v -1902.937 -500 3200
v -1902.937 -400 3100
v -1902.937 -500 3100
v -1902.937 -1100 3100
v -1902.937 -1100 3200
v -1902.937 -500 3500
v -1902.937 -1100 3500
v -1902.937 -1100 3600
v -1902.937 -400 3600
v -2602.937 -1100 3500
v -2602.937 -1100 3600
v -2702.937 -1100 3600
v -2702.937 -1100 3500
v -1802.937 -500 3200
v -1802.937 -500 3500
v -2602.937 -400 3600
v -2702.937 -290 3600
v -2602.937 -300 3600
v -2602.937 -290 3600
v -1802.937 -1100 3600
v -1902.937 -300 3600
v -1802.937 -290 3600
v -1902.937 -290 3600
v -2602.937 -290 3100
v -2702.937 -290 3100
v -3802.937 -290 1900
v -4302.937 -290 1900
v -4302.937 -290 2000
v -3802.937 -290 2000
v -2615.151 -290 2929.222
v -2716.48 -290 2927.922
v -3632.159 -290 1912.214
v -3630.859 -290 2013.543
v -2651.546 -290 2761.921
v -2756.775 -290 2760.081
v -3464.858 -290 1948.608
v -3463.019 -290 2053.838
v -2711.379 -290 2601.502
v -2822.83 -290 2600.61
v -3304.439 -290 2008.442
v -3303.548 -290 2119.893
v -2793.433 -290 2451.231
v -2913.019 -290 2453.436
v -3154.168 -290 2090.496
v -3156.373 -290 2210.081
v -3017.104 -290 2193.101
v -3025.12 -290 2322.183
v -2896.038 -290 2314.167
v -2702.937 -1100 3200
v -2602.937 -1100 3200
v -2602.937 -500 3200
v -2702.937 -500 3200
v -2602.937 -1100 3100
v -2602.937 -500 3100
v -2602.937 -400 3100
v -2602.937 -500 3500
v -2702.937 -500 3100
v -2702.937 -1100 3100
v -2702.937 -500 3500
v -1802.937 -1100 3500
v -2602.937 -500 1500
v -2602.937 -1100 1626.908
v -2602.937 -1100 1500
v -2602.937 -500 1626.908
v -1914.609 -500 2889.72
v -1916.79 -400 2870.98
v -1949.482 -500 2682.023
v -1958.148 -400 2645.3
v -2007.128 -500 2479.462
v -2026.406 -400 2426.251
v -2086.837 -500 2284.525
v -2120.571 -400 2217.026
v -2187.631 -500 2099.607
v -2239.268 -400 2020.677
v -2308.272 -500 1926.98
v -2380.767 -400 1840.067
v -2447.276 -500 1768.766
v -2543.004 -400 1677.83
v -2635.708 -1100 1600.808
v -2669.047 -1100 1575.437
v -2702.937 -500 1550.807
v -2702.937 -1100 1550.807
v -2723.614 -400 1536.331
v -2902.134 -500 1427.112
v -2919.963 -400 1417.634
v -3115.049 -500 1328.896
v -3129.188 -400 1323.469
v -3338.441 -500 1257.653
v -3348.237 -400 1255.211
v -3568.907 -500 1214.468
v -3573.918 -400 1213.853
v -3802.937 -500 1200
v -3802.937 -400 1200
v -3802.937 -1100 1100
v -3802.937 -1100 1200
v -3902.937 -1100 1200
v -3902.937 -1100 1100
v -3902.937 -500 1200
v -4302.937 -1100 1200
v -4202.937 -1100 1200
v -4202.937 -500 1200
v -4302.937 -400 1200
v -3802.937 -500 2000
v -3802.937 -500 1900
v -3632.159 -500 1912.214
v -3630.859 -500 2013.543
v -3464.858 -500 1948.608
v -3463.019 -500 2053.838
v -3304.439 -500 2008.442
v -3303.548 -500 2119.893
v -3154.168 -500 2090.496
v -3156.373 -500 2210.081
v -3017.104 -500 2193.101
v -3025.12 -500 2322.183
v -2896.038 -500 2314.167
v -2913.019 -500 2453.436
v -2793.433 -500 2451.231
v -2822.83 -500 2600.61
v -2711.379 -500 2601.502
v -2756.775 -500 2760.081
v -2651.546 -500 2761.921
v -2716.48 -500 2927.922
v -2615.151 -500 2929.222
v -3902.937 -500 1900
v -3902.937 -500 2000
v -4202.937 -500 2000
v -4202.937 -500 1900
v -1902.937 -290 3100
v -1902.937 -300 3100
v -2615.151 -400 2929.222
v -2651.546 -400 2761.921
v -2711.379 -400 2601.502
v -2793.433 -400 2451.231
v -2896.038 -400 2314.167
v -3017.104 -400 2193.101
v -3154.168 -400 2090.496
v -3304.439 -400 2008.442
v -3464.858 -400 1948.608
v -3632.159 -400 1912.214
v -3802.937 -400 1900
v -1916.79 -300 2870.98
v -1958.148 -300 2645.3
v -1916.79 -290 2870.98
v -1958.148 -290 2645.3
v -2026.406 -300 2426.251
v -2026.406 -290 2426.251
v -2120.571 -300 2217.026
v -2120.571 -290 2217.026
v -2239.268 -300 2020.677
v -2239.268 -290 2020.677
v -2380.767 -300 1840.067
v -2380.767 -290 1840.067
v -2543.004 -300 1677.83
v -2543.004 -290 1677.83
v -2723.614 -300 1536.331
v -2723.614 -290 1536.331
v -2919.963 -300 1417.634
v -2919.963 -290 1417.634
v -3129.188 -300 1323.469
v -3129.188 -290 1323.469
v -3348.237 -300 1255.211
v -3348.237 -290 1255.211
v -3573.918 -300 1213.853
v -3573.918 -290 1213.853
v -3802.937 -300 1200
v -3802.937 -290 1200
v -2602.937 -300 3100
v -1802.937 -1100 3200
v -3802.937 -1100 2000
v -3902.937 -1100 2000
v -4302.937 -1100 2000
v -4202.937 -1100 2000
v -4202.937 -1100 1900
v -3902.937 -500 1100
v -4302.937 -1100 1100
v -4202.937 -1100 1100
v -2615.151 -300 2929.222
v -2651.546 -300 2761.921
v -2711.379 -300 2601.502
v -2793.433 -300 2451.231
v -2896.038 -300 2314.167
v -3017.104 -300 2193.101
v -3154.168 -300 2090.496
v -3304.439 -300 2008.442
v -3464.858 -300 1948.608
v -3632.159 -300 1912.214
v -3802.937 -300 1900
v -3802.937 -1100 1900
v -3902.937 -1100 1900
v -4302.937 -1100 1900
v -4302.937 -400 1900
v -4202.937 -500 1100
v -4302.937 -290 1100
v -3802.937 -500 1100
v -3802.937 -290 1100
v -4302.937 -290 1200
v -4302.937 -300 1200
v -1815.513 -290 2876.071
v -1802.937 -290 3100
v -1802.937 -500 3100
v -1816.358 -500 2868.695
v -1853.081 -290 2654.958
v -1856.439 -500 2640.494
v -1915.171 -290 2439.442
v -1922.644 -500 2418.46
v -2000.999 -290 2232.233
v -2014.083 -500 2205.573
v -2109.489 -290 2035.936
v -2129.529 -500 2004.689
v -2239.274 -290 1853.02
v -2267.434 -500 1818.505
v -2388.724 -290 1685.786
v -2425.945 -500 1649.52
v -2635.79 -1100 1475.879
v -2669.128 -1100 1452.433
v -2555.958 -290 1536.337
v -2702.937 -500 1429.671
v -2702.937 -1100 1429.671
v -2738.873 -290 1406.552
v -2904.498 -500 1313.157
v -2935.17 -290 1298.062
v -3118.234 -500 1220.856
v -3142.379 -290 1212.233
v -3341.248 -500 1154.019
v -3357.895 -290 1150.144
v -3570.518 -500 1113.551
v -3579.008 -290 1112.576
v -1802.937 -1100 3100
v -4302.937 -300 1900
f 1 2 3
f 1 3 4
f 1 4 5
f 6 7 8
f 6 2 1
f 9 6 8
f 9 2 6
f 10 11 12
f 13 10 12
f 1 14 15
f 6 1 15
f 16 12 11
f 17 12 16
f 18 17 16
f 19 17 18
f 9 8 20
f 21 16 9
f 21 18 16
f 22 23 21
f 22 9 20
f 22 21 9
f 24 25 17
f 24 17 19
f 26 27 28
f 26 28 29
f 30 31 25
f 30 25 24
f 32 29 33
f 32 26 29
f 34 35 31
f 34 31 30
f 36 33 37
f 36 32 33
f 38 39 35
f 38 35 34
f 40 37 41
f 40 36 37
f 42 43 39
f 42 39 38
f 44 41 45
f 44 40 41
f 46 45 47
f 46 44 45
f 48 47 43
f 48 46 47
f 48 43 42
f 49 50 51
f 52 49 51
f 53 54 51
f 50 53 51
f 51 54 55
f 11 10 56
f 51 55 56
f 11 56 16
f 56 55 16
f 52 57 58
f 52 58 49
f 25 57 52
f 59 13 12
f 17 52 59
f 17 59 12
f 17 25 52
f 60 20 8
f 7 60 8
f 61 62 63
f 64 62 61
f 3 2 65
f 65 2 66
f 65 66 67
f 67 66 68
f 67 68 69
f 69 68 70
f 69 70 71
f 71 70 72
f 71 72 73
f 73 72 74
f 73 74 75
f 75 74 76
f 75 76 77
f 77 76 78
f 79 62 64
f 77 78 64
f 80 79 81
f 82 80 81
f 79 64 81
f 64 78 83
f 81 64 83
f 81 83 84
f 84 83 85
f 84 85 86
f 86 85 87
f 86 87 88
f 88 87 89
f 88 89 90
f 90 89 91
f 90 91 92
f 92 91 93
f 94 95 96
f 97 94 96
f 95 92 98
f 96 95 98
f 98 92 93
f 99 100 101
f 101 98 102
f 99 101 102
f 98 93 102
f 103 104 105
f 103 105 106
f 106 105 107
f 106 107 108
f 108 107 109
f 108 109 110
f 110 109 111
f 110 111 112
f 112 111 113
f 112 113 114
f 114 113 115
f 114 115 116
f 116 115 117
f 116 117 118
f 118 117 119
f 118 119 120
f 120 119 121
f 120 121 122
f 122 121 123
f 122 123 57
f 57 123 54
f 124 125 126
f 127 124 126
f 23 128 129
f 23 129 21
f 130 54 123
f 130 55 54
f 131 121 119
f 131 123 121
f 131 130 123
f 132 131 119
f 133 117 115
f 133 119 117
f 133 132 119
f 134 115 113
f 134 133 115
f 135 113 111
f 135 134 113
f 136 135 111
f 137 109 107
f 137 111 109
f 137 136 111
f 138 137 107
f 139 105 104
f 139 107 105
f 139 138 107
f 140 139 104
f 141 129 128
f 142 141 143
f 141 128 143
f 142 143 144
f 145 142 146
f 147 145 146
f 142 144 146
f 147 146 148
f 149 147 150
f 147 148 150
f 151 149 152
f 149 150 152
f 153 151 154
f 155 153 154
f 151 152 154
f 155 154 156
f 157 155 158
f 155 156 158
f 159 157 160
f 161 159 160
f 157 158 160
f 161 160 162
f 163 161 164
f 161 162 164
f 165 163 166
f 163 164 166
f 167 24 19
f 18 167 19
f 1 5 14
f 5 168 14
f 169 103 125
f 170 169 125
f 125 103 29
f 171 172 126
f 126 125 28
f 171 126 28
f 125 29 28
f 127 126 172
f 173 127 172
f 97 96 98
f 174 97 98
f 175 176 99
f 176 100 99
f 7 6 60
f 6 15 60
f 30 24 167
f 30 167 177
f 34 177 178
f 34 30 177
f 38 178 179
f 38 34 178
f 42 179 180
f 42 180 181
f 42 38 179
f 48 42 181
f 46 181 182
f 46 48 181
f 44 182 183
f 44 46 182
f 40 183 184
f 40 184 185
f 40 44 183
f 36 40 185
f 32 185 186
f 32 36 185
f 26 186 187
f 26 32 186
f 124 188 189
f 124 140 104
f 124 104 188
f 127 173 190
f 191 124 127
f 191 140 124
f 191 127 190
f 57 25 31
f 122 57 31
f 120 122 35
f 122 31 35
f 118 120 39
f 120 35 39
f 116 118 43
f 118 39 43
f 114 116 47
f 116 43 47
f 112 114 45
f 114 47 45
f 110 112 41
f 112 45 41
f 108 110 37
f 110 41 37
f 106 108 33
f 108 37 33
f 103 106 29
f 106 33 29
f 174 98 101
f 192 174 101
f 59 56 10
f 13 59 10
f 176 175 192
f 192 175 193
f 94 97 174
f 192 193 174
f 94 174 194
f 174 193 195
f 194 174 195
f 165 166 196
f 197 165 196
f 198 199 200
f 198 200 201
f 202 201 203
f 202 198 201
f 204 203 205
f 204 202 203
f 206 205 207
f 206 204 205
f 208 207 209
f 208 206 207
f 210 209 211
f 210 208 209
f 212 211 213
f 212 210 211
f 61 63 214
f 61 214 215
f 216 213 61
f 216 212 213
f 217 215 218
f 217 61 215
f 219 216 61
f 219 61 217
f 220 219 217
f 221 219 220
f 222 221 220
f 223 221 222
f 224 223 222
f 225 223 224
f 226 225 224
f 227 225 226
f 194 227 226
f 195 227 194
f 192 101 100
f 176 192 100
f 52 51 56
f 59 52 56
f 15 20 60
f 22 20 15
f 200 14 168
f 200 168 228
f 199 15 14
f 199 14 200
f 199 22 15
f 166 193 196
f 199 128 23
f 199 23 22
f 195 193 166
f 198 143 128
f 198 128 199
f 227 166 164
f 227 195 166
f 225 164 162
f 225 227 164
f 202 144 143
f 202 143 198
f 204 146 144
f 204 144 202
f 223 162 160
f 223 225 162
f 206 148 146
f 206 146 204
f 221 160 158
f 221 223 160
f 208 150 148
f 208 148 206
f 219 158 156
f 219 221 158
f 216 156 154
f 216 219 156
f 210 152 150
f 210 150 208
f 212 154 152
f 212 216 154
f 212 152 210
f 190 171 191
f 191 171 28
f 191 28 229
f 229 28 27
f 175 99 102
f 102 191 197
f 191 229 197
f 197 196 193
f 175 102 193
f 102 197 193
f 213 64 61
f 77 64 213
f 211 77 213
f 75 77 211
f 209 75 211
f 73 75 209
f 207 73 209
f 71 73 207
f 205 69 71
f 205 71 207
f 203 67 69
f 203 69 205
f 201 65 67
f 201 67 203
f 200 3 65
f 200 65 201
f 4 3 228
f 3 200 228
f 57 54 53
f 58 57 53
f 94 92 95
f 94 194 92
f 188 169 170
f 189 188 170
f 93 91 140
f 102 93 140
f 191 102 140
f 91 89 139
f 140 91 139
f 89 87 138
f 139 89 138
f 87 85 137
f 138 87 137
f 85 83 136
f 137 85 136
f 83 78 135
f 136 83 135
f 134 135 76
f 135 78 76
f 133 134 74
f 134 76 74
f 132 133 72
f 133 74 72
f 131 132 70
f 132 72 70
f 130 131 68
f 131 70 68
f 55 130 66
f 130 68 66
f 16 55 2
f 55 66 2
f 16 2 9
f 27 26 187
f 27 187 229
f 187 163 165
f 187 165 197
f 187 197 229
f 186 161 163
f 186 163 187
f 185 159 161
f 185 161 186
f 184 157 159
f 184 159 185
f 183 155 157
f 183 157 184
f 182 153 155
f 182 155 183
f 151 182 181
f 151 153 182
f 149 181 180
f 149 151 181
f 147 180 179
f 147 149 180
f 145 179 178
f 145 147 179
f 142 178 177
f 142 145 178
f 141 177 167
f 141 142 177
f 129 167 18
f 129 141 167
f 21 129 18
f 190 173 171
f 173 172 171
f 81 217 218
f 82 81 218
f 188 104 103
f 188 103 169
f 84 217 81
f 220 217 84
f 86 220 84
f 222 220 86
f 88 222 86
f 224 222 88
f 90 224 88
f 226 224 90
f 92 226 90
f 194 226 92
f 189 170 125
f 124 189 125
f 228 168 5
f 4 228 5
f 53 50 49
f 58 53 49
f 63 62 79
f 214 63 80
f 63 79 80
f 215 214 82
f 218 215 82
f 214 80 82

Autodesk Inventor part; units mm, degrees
ref_plane "YZ Plane" through (0, 0, 0) normal (1, 0, 0) x (0, 1, 0)
ref_plane "XZ Plane" through (0, 0, 0) normal (0, 1, 0) x (-1, 0, 0)
ref_plane "XY Plane" through (0, 0, 0) normal (0, 0, 1) x (1, 0, 0)
sketch "Sketch1" plane through (0, 0, 0) normal (0, 1, 0) x (-1, 0, 0)
  arc A0 (2702.9372, 3100) -> (3802.9372, 2000) centre (3802.9372, 3100) ccw
  arc A1 (1802.9372, 3100) -> (3802.9372, 1100) centre (3802.9372, 3100) ccw
  arc A2 (2602.9372, 3100) -> (3802.9372, 1900) centre (3802.9372, 3100) ccw
  arc A3 (1902.9372, 3100) -> (3802.9372, 1200) centre (3802.9372, 3100) ccw
  line L0 (3802.9372, 2000) -> (4302.9372, 2000)
  line L1 (4302.9372, 2000) -> (4302.9372, 1100)
  line L2 (4302.9372, 1100) -> (3802.9372, 1100)
  line L3 (3802.9372, 1900) -> (4302.9372, 1900)
  line L4 (3802.9372, 1200) -> (4302.9372, 1200)
  line L5 (2702.9372, 3100) -> (2702.9372, 3600)
  line L6 (2702.9372, 3600) -> (1802.9372, 3600)
  line L7 (1802.9372, 3600) -> (1802.9372, 3100)
  line L8 (2602.9372, 3100) -> (2602.9372, 3600)
  line L9 (1902.9372, 3100) -> (1902.9372, 3600)
  point P0 (2702.9372, 3100)
extrude "Extrusion1" add sketch "Sketch1" against normal blind 1100 contours A0 L0 L1 L3 A2 L8 L6 L5 | L9 A3 L4 L1 L2 A1 L7 L6
sketch "Sketch2" plane through (-1802.9372, 0, 3600) normal (1, 0, 0) x (0, 0, -1)
  line L0 (500, 0) -> (0, 0) projected
  line L1 (0, 0) -> (500, 0)
  line L2 (500, -300) -> (0, -300)
  line L3 (0, 0) -> (500, 0)
  line L4 (500, -400) -> (0, -400)
  line L5 (500, 0) -> (2500, 0) projected
  line L6 (500, 0) -> (500, -1100) projected
  line L7 (2500, -1100) -> (500, -1100) projected
  line L8 (2500, 0) -> (2500, -1100) projected
  line L9 (0, -400) -> (2500, -400)
  line L10 (2500, -400) -> (2500, -300)
  line L11 (2500, -300) -> (0, -300)
  line L12 (0, -300) -> (0, -400)
  line L13 (2500, -400) -> (2500, -300)
  point P0 (3600, 0)
  point P1 (0, -300)
  point P2 (500, -400)
  point P3 (2500, -400)
  point P4 (500, -300)
extrude "Extrusion2" add sketch "Sketch2" against normal blind 2500 contours L6 L4 L12 L2 | L11 L8 L9 L6
sketch "Sketch3" plane through (-4302.9372, -300, 3600) normal (0, 1, 0) x (1, 0, 0)
  line L0 (0, 1600) -> (500, 1600) projected
  line L1 (0, 0) -> (0, 1600) projected
  line L2 (1600, 0) -> (0, 0) projected
  line L3 (1600, 500) -> (1600, 0) projected
  arc A0 (1600, 500) -> (500, 1600) centre (500, 500) ccw projected
  arc A1 (2500, 500) -> (500, 2500) centre (500, 500) ccw projected
  line L4 (2500, 2500) -> (2500, 500) projected
  line L5 (2500, 2500) -> (500, 2500) projected
  point P0 (4302.9372, 3600)
extrude "Extrusion3" cut sketch "Sketch3" against normal blind 200
sketch "Sketch4" plane through (-1802.9372, 0, 3600) normal (1, 0, 0) x (0, 0, -1)
  line L0 (1600, 0) -> (1600, -1100) projected
  line L1 (500, 0) -> (500, -1100) projected
  line L2 (500, -1100) -> (2500, -1100) projected
  line L3 (500, -1100) -> (1600, -1100)
  line L4 (1600, -1100) -> (1600, -500)
  line L5 (1600, -500) -> (500, -500)
  line L6 (500, -500) -> (500, -1100)
  point P0 (3600, 0)
  point P1 (1600, -500)
  dimension "d25" = 1100
  dimension "d26" = 600
extrude "Extrusion4" cut sketch "Sketch4" against normal blind 3000
sketch "Sketch5" plane through (-3802.9372, 0, 1100) normal (0, 0, -1) x (-1, 0, 0)
  line L0 (-1100, 0) -> (-1100, -1100) projected
  line L1 (0, 0) -> (0, -1100) projected
  line L2 (-1670.3293, -1100) -> (0, -1100) projected
  line L3 (0, -1100) -> (-1100, -1100)
  line L4 (-1100, -1100) -> (-1100, -500)
  line L5 (-1100, -500) -> (0, -500)
  line L6 (0, -500) -> (0, -1100)
  point P0 (-3802.9372, 0)
  point P1 (0, -500)
  dimension "d29" = 1100
  dimension "d30" = 600
extrude "Extrusion5" cut sketch "Sketch5" against normal blind 3000
sketch "Sketch6" plane through (0, 0, 0) normal (0, 1, 0) x (1, 0, 0)
  line L0 (-1802.9372, -3100) -> (-1802.9372, -3600) projected
  line L1 (-4302.9372, -1082.625) -> (-1802.9372, -1082.625)
  line L2 (-1802.9372, -1082.625) -> (-1802.9372, -3600)
  line L3 (-1802.9372, -3600) -> (-4302.9372, -3600)
  line L4 (-4302.9372, -3600) -> (-4302.9372, -1082.625)
  point P0 (0, 0)
extrude "Extrusion6" cut sketch "Sketch6" against normal blind 290
sketch "Sketch7" plane through (-1802.9372, -1100, 3100) normal (1, 0, 0) x (0, 0, -1)
  line L0 (-500, 0) -> (-400, 0)
  line L1 (0, 0) -> (-500, 0) projected
  line L2 (0, 0) -> (-100, 0)
  line L3 (-400, 0) -> (-100, 0)
  line L4 (-100, 0) -> (-100, 600)
  line L5 (-100, 600) -> (-400, 600)
  line L6 (-400, 600) -> (-400, 0)
  point P0 (3100, 1100)
  dimension "d35" = 100
  dimension "d36" = 100
  dimension "d37" = 600
extrude "Extrusion7" cut sketch "Sketch7" against normal through all
sketch "Sketch8" plane through (-4302.9372, -1100, 2000) normal (0, 0, 1) x (1, 0, 0)
  line L0 (0, 0) -> (100, 0)
  line L1 (0, 0) -> (500, 0) projected
  line L2 (500, 0) -> (400, 0)
  line L3 (100, 0) -> (400, 0)
  line L4 (400, 0) -> (400, 600)
  line L5 (400, 600) -> (100, 600)
  line L6 (100, 600) -> (100, 0)
  point P0 (4302.9372, 1100)
  dimension "d40" = 100
  dimension "d41" = 100
  dimension "d42" = 600
extrude "Extrusion8" cut sketch "Sketch8" against normal through all
sketch "Sketch9" plane through (-2253.7438, -500, 2000) normal (0, 0, 1) x (1, 0, 0)
  line L0 (121.136, 0) -> (121.136, -600) projected
  line L1 (-349.1933, -600) -> (-349.1933, 0) projected
  line L2 (121.136, -600) -> (-349.1933, -600)
  line L3 (-349.1933, -600) -> (-349.1933, 0)
  line L4 (-349.1933, 0) -> (121.136, 0)
  line L5 (121.136, 0) -> (121.136, -600)
  point P0 (2253.7438, 500)
extrude "Extrusion9" cut sketch "Sketch9" against normal through all
sketch "Sketch10" plane through (-2702.9372, -1100, 1429.6707) normal (-1, 0, 0) x (0, 0, 1)
  point P0 (-1429.6707, 1100)
properties part number "Banda_CI_5m"
